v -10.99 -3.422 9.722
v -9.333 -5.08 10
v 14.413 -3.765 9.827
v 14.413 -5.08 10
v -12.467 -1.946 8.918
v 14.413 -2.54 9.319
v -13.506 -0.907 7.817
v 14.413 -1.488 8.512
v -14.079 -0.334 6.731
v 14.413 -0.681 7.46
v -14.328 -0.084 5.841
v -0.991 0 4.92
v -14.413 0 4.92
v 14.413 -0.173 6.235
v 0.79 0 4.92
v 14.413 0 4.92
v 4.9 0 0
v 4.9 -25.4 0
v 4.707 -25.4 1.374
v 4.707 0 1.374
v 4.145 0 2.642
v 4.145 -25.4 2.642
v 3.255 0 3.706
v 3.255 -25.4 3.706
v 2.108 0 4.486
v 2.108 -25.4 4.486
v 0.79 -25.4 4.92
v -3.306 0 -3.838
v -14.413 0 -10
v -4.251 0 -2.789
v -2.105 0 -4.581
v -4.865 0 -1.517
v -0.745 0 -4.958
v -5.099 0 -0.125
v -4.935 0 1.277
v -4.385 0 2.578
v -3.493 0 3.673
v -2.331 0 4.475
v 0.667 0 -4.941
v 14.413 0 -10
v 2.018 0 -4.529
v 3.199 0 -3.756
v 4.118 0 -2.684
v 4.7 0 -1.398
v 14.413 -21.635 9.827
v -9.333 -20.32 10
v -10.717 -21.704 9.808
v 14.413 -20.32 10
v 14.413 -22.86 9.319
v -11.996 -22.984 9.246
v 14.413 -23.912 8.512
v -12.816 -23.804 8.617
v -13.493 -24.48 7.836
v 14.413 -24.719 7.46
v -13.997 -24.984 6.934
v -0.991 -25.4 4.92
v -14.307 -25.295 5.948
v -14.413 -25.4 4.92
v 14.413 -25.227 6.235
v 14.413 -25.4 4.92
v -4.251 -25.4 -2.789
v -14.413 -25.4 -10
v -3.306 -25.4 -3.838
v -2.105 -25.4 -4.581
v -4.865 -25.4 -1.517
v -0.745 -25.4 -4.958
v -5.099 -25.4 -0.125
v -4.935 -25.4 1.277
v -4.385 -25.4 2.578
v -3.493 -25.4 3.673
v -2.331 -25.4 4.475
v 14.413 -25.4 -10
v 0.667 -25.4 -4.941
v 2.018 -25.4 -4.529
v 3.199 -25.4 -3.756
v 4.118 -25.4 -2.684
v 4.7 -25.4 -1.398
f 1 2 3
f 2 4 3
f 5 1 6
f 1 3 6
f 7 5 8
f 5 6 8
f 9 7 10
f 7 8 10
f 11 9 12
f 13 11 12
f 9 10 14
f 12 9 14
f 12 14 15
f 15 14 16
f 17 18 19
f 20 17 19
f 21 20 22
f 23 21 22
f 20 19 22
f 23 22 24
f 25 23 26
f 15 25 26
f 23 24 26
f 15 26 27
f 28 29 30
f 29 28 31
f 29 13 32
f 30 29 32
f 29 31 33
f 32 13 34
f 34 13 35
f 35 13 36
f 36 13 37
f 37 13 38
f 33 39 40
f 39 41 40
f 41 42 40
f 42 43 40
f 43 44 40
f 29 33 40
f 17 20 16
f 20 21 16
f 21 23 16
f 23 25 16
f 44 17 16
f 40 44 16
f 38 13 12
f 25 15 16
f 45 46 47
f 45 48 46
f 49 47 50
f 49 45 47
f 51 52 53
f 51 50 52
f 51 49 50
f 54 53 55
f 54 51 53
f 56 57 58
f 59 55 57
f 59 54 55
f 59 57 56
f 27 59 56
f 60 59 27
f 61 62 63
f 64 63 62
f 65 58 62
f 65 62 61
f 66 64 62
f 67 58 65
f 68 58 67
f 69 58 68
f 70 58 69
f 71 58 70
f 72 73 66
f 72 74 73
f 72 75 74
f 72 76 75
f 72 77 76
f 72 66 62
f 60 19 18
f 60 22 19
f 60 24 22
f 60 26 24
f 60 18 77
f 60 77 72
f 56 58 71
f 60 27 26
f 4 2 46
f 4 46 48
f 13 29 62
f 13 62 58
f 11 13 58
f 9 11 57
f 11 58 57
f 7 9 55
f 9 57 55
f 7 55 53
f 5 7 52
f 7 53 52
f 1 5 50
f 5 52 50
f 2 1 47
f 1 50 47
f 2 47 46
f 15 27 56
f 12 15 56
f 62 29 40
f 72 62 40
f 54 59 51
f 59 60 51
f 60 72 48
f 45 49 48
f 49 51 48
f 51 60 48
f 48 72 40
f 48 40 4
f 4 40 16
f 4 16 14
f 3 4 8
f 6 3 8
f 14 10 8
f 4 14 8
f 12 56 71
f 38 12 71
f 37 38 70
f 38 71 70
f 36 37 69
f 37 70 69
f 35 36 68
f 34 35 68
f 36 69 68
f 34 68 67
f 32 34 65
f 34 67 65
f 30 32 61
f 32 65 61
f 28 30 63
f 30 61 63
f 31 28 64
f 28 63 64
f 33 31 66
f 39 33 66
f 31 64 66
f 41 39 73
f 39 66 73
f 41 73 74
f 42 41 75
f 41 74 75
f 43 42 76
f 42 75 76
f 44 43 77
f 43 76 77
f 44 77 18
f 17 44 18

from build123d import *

# Parameters (mm, degrees)
F0_W     = 28.8251918835
F0_H     = 20
F1_DEPTH = 25.4
F2_R     = 5.08
F4_DEPTH = 25.401


with BuildPart() as f1:
    # F0 (on Front) → F1 (new body)
    with BuildSketch(Plane.XZ):
        Rectangle(F0_W, F0_H)
    extrude(amount=F1_DEPTH)

    # F2
    f2_edges = [f1.edges().sort_by_distance(p)[0] for p in [
        (0, 0, 10),
        (-14.412596, -12.7, 10),
        (0, -25.4, 10),
    ]]
    fillet(f2_edges, radius=F2_R)

    # F3 (on face) → F4 (cut, through all)
    with BuildSketch(Plane.XZ.offset(25.4)):
        with BuildLine():
            ThreePointArc((-0.9913088891, 4.92), (-3.3056021973, -3.8375911383), (4.899533409, 0))
            ThreePointArc((4.899533409, 0), (3.7371245473, 3.2051356063), (0.790375707, 4.92))
            Line((0.790375707, 4.92), (-0.9913088891, 4.92))
        make_face()
    extrude(amount=-F4_DEPTH, mode=Mode.SUBTRACT)


solid = f1.part
